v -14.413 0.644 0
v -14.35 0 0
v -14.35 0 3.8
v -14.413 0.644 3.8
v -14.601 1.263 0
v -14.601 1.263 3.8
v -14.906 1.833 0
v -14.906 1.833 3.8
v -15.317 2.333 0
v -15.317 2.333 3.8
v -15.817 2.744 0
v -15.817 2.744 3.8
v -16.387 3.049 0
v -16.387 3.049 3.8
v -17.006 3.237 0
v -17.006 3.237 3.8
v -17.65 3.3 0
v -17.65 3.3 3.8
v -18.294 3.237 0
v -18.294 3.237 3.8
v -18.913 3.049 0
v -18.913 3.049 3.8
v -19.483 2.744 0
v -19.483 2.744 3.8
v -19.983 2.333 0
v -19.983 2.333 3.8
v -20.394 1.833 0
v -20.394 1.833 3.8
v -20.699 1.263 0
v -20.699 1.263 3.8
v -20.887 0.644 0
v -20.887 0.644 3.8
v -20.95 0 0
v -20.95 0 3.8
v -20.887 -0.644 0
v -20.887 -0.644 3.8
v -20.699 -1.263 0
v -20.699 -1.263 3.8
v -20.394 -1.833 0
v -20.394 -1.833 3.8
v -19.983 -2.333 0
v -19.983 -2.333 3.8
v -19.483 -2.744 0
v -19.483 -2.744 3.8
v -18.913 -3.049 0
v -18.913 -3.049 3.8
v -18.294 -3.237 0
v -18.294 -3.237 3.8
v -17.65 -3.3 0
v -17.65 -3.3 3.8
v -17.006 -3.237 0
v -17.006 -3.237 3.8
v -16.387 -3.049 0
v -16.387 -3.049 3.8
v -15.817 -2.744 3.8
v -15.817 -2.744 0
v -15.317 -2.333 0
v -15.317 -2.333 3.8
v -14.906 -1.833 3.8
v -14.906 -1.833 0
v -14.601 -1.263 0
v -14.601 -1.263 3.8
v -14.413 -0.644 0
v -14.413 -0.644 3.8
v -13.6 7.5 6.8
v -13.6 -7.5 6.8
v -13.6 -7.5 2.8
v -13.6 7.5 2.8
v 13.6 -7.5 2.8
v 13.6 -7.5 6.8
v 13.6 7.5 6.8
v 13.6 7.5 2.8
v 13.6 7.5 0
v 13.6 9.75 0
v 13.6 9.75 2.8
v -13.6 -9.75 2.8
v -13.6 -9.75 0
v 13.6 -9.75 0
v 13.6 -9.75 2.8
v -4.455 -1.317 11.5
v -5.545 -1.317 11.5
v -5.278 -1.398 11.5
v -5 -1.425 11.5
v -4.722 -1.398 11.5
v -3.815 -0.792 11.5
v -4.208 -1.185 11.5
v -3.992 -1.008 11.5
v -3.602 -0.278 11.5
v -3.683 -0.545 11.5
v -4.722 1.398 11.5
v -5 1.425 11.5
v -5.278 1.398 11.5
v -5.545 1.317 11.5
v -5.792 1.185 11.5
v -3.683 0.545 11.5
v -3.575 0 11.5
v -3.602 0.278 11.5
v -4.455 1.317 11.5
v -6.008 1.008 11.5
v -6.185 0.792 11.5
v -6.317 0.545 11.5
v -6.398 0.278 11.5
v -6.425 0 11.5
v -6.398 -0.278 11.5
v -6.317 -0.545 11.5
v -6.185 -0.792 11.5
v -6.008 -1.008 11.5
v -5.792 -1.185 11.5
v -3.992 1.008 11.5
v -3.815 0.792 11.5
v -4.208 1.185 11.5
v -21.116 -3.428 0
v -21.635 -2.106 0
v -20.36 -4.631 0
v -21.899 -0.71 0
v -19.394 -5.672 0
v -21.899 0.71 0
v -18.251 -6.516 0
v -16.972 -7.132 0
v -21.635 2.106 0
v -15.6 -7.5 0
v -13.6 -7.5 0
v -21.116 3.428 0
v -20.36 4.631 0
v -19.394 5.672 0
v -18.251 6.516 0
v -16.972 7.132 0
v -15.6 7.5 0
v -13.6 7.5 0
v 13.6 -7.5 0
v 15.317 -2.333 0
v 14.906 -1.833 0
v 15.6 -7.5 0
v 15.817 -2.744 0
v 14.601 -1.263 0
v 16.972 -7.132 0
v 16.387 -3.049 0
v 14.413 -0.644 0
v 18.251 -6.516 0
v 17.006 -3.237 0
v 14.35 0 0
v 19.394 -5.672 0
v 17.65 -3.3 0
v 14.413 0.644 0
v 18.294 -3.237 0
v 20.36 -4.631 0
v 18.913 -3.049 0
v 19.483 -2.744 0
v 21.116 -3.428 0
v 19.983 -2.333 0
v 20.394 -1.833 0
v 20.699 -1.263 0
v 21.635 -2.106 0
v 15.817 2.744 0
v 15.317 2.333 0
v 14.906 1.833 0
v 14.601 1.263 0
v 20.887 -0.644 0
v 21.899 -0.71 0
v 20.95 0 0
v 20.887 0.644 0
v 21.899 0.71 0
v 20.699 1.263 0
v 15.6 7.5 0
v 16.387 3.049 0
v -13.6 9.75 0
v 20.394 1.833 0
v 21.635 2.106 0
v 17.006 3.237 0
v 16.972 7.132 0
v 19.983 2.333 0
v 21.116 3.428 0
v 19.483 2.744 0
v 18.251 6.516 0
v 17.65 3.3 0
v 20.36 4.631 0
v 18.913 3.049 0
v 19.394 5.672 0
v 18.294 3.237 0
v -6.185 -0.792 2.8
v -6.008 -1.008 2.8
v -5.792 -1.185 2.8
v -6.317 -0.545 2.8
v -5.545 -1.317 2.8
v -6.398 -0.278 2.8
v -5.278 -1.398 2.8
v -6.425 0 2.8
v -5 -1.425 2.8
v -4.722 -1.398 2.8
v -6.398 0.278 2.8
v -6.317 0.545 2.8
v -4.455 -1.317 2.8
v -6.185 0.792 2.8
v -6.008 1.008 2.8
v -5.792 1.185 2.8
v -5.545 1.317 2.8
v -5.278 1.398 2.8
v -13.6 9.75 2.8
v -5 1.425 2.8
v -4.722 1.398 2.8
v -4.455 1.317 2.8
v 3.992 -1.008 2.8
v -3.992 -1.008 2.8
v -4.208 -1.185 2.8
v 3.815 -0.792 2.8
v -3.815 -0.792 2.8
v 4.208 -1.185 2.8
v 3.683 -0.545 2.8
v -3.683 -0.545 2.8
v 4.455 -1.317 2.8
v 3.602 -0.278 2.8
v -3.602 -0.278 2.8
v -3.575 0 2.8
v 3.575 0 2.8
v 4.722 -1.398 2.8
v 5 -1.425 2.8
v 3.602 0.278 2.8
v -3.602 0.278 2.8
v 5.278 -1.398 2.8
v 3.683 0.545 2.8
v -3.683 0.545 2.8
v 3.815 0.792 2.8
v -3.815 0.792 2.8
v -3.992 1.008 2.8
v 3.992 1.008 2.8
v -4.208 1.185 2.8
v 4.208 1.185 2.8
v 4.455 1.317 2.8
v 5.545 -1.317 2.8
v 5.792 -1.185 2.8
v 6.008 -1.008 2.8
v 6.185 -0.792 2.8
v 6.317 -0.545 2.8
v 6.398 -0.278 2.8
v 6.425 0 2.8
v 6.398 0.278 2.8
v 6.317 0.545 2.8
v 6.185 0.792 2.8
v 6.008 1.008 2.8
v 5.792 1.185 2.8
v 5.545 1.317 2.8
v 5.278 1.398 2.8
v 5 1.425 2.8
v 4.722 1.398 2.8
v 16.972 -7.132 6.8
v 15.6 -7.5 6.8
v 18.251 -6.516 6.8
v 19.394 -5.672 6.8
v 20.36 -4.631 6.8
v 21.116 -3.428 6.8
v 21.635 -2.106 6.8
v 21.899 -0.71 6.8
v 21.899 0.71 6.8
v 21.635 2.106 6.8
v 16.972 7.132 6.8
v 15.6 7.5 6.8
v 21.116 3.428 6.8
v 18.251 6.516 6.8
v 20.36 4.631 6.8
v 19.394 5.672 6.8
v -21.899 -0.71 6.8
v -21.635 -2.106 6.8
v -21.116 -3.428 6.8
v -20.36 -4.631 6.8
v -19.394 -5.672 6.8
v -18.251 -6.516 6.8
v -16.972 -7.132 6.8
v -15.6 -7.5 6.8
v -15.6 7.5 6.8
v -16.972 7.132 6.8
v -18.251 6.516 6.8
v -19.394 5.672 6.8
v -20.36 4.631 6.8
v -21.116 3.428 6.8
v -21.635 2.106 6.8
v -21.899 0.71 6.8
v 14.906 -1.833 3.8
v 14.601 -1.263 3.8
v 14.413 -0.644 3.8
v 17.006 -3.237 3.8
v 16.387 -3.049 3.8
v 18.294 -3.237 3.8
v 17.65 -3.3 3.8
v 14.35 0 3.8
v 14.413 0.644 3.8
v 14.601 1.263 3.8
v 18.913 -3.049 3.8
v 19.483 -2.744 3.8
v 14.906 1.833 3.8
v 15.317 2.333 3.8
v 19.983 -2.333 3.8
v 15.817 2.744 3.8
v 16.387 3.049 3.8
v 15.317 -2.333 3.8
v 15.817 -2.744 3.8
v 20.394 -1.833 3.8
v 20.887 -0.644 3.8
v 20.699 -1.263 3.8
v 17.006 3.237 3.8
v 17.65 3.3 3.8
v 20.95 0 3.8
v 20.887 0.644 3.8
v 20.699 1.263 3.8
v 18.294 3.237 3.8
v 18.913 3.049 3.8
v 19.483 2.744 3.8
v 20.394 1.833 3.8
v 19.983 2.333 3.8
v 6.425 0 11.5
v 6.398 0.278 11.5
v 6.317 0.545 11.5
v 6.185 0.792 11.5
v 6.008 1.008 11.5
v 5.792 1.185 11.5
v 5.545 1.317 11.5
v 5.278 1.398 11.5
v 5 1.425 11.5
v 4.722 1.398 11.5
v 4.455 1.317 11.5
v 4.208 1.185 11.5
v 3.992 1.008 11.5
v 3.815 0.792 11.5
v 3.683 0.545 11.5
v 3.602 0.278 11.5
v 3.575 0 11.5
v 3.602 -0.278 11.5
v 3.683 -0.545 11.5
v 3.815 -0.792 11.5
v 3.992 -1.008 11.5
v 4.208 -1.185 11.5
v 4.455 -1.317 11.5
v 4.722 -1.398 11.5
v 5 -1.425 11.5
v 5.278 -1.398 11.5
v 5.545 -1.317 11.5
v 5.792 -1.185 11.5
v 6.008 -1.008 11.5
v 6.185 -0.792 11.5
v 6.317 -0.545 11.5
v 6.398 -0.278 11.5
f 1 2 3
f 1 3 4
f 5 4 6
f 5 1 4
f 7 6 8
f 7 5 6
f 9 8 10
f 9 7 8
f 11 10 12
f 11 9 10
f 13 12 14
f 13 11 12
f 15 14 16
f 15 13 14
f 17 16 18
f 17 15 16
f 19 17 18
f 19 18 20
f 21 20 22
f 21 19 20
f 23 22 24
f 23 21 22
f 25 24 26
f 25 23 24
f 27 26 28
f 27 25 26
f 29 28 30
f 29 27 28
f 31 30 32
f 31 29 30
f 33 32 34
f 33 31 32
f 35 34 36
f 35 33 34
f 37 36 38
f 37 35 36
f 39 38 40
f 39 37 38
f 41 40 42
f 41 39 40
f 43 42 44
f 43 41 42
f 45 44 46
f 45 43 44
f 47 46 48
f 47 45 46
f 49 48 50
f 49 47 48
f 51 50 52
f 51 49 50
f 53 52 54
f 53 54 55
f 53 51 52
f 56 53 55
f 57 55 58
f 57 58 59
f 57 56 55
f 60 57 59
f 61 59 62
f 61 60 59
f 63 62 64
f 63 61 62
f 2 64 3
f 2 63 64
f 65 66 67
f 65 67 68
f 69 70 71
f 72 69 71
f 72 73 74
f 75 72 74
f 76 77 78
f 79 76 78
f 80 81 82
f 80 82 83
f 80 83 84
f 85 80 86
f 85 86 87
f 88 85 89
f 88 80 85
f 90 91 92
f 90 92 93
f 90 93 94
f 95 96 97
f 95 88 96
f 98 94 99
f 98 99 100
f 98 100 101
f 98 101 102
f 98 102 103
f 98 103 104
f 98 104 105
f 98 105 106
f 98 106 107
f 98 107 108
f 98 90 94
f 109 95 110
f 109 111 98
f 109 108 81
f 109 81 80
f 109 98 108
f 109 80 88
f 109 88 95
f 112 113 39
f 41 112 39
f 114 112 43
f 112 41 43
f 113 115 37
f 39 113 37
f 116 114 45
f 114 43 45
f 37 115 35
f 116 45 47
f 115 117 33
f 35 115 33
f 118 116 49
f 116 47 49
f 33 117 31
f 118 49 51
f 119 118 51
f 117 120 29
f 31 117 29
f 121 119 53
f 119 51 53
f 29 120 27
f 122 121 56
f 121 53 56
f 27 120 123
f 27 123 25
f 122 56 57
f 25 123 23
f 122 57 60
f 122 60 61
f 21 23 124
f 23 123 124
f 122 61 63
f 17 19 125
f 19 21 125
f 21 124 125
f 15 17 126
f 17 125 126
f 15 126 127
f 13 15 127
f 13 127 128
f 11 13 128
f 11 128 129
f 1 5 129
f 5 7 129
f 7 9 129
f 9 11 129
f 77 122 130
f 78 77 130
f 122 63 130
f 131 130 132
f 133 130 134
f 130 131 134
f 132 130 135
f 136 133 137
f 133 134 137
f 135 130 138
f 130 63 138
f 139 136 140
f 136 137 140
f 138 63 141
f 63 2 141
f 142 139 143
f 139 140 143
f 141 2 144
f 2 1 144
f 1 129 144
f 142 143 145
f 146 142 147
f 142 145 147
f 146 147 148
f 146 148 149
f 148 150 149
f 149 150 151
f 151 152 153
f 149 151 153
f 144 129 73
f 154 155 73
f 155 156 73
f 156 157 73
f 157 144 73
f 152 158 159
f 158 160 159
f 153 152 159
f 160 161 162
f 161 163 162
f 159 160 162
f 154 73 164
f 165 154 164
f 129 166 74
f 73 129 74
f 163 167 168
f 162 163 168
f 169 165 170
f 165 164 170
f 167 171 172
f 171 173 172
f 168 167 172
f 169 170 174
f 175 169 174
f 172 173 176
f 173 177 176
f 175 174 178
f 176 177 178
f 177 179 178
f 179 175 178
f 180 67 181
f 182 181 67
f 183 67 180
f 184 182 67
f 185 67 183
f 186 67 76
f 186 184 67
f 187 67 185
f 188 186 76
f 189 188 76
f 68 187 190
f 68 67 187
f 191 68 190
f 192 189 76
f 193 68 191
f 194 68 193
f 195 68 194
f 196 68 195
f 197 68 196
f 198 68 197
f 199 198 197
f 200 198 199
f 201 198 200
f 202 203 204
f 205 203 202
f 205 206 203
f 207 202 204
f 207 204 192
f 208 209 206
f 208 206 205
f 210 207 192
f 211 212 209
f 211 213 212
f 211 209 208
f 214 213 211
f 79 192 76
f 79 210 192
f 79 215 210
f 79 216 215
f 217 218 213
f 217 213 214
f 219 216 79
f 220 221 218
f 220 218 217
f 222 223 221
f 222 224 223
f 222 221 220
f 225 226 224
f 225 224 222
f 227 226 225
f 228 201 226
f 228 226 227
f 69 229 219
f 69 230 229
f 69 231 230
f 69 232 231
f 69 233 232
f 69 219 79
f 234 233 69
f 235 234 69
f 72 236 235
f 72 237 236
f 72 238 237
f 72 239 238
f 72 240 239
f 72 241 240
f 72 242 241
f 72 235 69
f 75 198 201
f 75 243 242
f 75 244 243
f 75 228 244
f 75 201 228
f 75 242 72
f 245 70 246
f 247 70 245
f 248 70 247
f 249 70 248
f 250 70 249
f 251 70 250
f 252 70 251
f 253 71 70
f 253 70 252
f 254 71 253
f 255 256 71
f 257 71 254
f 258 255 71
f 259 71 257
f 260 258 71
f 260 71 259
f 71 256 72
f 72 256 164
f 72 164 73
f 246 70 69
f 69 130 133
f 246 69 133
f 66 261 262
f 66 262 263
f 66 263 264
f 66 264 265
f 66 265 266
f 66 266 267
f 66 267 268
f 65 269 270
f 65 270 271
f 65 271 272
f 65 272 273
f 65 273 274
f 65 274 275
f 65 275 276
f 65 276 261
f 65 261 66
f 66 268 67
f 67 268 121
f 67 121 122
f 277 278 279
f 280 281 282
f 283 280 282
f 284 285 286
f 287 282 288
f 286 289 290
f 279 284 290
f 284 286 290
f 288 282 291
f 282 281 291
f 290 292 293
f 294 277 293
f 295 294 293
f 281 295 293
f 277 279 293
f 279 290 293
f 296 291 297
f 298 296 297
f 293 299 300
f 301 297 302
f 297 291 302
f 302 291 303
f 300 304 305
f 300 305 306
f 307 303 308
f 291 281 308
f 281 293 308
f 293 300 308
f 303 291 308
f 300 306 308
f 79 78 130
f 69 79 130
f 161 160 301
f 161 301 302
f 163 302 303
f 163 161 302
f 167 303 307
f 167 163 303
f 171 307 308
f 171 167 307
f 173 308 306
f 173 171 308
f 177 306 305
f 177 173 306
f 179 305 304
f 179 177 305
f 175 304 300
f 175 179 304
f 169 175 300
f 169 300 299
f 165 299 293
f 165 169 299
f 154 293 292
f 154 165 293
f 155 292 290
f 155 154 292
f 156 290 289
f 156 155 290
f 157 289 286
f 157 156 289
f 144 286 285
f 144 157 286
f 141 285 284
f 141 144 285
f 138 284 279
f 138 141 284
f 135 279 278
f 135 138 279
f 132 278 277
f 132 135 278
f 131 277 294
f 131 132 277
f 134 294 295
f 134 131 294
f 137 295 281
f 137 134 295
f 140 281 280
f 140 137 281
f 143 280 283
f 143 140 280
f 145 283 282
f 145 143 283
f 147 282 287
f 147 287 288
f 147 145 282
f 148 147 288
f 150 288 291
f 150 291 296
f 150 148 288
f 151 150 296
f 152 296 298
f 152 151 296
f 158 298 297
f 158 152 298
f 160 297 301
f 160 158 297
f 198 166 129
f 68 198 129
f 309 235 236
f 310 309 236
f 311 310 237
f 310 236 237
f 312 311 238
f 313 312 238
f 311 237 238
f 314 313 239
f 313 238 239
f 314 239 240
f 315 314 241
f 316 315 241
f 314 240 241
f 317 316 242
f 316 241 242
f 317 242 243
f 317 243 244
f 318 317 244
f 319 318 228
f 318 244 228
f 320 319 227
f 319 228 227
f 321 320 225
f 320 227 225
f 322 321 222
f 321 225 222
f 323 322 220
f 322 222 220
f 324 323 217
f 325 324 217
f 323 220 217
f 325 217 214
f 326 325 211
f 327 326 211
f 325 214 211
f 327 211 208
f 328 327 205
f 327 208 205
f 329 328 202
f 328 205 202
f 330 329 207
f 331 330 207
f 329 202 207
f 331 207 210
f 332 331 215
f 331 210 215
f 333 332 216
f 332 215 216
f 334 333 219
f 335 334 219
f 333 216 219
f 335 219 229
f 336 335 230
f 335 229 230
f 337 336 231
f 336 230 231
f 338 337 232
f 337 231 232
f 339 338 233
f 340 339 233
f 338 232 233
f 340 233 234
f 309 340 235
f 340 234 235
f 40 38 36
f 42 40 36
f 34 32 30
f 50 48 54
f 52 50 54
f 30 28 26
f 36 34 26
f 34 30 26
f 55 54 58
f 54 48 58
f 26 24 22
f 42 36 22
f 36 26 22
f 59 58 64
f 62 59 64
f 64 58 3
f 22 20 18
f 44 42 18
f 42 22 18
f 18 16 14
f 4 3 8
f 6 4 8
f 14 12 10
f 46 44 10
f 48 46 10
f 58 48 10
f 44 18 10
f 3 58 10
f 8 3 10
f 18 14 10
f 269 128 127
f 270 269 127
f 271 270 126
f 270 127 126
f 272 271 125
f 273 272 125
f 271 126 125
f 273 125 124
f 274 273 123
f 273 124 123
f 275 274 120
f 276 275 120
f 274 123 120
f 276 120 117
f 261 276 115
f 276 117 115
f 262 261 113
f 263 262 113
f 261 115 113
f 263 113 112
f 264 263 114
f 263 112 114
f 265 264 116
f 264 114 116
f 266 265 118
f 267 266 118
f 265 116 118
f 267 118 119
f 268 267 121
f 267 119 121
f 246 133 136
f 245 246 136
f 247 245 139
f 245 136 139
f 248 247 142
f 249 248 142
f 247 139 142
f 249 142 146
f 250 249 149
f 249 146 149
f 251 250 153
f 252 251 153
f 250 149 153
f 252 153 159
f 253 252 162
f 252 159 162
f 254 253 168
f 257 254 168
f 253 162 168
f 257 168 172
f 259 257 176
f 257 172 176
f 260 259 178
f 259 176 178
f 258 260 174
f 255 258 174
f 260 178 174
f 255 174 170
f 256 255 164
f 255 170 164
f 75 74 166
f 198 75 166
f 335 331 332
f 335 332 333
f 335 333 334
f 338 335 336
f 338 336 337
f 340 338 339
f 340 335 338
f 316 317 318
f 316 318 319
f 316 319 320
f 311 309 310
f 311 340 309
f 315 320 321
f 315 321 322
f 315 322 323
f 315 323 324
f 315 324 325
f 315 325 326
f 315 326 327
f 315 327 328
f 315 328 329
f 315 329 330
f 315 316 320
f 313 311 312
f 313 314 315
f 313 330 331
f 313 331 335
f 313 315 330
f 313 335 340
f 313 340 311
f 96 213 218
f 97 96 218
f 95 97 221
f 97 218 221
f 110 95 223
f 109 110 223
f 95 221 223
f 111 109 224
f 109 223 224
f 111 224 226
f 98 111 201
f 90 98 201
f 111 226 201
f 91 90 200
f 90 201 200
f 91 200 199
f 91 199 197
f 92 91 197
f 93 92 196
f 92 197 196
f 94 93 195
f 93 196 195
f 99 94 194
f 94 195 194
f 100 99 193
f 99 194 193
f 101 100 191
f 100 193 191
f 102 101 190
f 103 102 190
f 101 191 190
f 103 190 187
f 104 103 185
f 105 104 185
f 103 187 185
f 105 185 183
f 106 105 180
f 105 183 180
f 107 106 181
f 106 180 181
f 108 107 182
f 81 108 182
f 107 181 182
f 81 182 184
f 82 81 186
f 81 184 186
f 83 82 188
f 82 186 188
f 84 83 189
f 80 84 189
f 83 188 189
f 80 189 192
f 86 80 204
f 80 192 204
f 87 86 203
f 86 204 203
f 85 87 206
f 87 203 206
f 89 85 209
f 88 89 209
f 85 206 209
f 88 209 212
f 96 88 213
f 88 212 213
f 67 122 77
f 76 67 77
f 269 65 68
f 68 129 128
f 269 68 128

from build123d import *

# Parameters (mm, degrees)
F1_DEPTH = 6.8
F2_W     = 27.2
F2_H     = 19.5
F3_DEPTH = 4
F4_R     = 3.3
F5_DEPTH = 3.8
F6_R     = 1.425
F7_DEPTH = 8.7


with BuildPart() as f1:
    # F0 (on Top) → F1 (new body)
    with BuildSketch(Plane.XY):
        with BuildLine():
            Line((13.6, 7.5), (13.6, 9.75))
            Line((13.6, 9.75), (-13.6, 9.75))
            Line((-13.6, 9.75), (-13.6, 7.5))
            Line((-13.6, 7.5), (-15.6, 7.5))
            ThreePointArc((-15.6, 7.5), (-21.931769, 0), (-15.6, -7.5))
            Line((-15.6, -7.5), (-13.6, -7.5))
            Line((-13.6, -7.5), (-13.6, -9.75))
            Line((-13.6, -9.75), (13.6, -9.75))
            Line((13.6, -9.75), (13.6, -7.5))
            Line((13.6, -7.5), (15.6, -7.5))
            ThreePointArc((15.6, -7.5), (21.931769, 0), (15.6, 7.5))
            Line((15.6, 7.5), (13.6, 7.5))
        make_face()
    extrude(amount=F1_DEPTH)

    # F2 (on face) → F3 (cut)
    with BuildSketch(Plane.XY.offset(6.8)):
        Rectangle(F2_W, F2_H)
    extrude(amount=-F3_DEPTH, mode=Mode.SUBTRACT)

    # F4 (on Top) → F5 (cut)
    with BuildSketch(Plane.XY):
        with Locations((17.65, 0)):
            Circle(F4_R)
        with Locations((-17.65, 0)):
            Circle(F4_R)
    extrude(amount=F5_DEPTH, mode=Mode.SUBTRACT)

    # F6 (on face) → F7 (join)
    with BuildSketch(Plane.XY.offset(2.8)):
        with Locations((5, 0)):
            Circle(F6_R)
        with Locations((-5, 0)):
            Circle(F6_R)
    extrude(amount=F7_DEPTH)


solid = f1.part
